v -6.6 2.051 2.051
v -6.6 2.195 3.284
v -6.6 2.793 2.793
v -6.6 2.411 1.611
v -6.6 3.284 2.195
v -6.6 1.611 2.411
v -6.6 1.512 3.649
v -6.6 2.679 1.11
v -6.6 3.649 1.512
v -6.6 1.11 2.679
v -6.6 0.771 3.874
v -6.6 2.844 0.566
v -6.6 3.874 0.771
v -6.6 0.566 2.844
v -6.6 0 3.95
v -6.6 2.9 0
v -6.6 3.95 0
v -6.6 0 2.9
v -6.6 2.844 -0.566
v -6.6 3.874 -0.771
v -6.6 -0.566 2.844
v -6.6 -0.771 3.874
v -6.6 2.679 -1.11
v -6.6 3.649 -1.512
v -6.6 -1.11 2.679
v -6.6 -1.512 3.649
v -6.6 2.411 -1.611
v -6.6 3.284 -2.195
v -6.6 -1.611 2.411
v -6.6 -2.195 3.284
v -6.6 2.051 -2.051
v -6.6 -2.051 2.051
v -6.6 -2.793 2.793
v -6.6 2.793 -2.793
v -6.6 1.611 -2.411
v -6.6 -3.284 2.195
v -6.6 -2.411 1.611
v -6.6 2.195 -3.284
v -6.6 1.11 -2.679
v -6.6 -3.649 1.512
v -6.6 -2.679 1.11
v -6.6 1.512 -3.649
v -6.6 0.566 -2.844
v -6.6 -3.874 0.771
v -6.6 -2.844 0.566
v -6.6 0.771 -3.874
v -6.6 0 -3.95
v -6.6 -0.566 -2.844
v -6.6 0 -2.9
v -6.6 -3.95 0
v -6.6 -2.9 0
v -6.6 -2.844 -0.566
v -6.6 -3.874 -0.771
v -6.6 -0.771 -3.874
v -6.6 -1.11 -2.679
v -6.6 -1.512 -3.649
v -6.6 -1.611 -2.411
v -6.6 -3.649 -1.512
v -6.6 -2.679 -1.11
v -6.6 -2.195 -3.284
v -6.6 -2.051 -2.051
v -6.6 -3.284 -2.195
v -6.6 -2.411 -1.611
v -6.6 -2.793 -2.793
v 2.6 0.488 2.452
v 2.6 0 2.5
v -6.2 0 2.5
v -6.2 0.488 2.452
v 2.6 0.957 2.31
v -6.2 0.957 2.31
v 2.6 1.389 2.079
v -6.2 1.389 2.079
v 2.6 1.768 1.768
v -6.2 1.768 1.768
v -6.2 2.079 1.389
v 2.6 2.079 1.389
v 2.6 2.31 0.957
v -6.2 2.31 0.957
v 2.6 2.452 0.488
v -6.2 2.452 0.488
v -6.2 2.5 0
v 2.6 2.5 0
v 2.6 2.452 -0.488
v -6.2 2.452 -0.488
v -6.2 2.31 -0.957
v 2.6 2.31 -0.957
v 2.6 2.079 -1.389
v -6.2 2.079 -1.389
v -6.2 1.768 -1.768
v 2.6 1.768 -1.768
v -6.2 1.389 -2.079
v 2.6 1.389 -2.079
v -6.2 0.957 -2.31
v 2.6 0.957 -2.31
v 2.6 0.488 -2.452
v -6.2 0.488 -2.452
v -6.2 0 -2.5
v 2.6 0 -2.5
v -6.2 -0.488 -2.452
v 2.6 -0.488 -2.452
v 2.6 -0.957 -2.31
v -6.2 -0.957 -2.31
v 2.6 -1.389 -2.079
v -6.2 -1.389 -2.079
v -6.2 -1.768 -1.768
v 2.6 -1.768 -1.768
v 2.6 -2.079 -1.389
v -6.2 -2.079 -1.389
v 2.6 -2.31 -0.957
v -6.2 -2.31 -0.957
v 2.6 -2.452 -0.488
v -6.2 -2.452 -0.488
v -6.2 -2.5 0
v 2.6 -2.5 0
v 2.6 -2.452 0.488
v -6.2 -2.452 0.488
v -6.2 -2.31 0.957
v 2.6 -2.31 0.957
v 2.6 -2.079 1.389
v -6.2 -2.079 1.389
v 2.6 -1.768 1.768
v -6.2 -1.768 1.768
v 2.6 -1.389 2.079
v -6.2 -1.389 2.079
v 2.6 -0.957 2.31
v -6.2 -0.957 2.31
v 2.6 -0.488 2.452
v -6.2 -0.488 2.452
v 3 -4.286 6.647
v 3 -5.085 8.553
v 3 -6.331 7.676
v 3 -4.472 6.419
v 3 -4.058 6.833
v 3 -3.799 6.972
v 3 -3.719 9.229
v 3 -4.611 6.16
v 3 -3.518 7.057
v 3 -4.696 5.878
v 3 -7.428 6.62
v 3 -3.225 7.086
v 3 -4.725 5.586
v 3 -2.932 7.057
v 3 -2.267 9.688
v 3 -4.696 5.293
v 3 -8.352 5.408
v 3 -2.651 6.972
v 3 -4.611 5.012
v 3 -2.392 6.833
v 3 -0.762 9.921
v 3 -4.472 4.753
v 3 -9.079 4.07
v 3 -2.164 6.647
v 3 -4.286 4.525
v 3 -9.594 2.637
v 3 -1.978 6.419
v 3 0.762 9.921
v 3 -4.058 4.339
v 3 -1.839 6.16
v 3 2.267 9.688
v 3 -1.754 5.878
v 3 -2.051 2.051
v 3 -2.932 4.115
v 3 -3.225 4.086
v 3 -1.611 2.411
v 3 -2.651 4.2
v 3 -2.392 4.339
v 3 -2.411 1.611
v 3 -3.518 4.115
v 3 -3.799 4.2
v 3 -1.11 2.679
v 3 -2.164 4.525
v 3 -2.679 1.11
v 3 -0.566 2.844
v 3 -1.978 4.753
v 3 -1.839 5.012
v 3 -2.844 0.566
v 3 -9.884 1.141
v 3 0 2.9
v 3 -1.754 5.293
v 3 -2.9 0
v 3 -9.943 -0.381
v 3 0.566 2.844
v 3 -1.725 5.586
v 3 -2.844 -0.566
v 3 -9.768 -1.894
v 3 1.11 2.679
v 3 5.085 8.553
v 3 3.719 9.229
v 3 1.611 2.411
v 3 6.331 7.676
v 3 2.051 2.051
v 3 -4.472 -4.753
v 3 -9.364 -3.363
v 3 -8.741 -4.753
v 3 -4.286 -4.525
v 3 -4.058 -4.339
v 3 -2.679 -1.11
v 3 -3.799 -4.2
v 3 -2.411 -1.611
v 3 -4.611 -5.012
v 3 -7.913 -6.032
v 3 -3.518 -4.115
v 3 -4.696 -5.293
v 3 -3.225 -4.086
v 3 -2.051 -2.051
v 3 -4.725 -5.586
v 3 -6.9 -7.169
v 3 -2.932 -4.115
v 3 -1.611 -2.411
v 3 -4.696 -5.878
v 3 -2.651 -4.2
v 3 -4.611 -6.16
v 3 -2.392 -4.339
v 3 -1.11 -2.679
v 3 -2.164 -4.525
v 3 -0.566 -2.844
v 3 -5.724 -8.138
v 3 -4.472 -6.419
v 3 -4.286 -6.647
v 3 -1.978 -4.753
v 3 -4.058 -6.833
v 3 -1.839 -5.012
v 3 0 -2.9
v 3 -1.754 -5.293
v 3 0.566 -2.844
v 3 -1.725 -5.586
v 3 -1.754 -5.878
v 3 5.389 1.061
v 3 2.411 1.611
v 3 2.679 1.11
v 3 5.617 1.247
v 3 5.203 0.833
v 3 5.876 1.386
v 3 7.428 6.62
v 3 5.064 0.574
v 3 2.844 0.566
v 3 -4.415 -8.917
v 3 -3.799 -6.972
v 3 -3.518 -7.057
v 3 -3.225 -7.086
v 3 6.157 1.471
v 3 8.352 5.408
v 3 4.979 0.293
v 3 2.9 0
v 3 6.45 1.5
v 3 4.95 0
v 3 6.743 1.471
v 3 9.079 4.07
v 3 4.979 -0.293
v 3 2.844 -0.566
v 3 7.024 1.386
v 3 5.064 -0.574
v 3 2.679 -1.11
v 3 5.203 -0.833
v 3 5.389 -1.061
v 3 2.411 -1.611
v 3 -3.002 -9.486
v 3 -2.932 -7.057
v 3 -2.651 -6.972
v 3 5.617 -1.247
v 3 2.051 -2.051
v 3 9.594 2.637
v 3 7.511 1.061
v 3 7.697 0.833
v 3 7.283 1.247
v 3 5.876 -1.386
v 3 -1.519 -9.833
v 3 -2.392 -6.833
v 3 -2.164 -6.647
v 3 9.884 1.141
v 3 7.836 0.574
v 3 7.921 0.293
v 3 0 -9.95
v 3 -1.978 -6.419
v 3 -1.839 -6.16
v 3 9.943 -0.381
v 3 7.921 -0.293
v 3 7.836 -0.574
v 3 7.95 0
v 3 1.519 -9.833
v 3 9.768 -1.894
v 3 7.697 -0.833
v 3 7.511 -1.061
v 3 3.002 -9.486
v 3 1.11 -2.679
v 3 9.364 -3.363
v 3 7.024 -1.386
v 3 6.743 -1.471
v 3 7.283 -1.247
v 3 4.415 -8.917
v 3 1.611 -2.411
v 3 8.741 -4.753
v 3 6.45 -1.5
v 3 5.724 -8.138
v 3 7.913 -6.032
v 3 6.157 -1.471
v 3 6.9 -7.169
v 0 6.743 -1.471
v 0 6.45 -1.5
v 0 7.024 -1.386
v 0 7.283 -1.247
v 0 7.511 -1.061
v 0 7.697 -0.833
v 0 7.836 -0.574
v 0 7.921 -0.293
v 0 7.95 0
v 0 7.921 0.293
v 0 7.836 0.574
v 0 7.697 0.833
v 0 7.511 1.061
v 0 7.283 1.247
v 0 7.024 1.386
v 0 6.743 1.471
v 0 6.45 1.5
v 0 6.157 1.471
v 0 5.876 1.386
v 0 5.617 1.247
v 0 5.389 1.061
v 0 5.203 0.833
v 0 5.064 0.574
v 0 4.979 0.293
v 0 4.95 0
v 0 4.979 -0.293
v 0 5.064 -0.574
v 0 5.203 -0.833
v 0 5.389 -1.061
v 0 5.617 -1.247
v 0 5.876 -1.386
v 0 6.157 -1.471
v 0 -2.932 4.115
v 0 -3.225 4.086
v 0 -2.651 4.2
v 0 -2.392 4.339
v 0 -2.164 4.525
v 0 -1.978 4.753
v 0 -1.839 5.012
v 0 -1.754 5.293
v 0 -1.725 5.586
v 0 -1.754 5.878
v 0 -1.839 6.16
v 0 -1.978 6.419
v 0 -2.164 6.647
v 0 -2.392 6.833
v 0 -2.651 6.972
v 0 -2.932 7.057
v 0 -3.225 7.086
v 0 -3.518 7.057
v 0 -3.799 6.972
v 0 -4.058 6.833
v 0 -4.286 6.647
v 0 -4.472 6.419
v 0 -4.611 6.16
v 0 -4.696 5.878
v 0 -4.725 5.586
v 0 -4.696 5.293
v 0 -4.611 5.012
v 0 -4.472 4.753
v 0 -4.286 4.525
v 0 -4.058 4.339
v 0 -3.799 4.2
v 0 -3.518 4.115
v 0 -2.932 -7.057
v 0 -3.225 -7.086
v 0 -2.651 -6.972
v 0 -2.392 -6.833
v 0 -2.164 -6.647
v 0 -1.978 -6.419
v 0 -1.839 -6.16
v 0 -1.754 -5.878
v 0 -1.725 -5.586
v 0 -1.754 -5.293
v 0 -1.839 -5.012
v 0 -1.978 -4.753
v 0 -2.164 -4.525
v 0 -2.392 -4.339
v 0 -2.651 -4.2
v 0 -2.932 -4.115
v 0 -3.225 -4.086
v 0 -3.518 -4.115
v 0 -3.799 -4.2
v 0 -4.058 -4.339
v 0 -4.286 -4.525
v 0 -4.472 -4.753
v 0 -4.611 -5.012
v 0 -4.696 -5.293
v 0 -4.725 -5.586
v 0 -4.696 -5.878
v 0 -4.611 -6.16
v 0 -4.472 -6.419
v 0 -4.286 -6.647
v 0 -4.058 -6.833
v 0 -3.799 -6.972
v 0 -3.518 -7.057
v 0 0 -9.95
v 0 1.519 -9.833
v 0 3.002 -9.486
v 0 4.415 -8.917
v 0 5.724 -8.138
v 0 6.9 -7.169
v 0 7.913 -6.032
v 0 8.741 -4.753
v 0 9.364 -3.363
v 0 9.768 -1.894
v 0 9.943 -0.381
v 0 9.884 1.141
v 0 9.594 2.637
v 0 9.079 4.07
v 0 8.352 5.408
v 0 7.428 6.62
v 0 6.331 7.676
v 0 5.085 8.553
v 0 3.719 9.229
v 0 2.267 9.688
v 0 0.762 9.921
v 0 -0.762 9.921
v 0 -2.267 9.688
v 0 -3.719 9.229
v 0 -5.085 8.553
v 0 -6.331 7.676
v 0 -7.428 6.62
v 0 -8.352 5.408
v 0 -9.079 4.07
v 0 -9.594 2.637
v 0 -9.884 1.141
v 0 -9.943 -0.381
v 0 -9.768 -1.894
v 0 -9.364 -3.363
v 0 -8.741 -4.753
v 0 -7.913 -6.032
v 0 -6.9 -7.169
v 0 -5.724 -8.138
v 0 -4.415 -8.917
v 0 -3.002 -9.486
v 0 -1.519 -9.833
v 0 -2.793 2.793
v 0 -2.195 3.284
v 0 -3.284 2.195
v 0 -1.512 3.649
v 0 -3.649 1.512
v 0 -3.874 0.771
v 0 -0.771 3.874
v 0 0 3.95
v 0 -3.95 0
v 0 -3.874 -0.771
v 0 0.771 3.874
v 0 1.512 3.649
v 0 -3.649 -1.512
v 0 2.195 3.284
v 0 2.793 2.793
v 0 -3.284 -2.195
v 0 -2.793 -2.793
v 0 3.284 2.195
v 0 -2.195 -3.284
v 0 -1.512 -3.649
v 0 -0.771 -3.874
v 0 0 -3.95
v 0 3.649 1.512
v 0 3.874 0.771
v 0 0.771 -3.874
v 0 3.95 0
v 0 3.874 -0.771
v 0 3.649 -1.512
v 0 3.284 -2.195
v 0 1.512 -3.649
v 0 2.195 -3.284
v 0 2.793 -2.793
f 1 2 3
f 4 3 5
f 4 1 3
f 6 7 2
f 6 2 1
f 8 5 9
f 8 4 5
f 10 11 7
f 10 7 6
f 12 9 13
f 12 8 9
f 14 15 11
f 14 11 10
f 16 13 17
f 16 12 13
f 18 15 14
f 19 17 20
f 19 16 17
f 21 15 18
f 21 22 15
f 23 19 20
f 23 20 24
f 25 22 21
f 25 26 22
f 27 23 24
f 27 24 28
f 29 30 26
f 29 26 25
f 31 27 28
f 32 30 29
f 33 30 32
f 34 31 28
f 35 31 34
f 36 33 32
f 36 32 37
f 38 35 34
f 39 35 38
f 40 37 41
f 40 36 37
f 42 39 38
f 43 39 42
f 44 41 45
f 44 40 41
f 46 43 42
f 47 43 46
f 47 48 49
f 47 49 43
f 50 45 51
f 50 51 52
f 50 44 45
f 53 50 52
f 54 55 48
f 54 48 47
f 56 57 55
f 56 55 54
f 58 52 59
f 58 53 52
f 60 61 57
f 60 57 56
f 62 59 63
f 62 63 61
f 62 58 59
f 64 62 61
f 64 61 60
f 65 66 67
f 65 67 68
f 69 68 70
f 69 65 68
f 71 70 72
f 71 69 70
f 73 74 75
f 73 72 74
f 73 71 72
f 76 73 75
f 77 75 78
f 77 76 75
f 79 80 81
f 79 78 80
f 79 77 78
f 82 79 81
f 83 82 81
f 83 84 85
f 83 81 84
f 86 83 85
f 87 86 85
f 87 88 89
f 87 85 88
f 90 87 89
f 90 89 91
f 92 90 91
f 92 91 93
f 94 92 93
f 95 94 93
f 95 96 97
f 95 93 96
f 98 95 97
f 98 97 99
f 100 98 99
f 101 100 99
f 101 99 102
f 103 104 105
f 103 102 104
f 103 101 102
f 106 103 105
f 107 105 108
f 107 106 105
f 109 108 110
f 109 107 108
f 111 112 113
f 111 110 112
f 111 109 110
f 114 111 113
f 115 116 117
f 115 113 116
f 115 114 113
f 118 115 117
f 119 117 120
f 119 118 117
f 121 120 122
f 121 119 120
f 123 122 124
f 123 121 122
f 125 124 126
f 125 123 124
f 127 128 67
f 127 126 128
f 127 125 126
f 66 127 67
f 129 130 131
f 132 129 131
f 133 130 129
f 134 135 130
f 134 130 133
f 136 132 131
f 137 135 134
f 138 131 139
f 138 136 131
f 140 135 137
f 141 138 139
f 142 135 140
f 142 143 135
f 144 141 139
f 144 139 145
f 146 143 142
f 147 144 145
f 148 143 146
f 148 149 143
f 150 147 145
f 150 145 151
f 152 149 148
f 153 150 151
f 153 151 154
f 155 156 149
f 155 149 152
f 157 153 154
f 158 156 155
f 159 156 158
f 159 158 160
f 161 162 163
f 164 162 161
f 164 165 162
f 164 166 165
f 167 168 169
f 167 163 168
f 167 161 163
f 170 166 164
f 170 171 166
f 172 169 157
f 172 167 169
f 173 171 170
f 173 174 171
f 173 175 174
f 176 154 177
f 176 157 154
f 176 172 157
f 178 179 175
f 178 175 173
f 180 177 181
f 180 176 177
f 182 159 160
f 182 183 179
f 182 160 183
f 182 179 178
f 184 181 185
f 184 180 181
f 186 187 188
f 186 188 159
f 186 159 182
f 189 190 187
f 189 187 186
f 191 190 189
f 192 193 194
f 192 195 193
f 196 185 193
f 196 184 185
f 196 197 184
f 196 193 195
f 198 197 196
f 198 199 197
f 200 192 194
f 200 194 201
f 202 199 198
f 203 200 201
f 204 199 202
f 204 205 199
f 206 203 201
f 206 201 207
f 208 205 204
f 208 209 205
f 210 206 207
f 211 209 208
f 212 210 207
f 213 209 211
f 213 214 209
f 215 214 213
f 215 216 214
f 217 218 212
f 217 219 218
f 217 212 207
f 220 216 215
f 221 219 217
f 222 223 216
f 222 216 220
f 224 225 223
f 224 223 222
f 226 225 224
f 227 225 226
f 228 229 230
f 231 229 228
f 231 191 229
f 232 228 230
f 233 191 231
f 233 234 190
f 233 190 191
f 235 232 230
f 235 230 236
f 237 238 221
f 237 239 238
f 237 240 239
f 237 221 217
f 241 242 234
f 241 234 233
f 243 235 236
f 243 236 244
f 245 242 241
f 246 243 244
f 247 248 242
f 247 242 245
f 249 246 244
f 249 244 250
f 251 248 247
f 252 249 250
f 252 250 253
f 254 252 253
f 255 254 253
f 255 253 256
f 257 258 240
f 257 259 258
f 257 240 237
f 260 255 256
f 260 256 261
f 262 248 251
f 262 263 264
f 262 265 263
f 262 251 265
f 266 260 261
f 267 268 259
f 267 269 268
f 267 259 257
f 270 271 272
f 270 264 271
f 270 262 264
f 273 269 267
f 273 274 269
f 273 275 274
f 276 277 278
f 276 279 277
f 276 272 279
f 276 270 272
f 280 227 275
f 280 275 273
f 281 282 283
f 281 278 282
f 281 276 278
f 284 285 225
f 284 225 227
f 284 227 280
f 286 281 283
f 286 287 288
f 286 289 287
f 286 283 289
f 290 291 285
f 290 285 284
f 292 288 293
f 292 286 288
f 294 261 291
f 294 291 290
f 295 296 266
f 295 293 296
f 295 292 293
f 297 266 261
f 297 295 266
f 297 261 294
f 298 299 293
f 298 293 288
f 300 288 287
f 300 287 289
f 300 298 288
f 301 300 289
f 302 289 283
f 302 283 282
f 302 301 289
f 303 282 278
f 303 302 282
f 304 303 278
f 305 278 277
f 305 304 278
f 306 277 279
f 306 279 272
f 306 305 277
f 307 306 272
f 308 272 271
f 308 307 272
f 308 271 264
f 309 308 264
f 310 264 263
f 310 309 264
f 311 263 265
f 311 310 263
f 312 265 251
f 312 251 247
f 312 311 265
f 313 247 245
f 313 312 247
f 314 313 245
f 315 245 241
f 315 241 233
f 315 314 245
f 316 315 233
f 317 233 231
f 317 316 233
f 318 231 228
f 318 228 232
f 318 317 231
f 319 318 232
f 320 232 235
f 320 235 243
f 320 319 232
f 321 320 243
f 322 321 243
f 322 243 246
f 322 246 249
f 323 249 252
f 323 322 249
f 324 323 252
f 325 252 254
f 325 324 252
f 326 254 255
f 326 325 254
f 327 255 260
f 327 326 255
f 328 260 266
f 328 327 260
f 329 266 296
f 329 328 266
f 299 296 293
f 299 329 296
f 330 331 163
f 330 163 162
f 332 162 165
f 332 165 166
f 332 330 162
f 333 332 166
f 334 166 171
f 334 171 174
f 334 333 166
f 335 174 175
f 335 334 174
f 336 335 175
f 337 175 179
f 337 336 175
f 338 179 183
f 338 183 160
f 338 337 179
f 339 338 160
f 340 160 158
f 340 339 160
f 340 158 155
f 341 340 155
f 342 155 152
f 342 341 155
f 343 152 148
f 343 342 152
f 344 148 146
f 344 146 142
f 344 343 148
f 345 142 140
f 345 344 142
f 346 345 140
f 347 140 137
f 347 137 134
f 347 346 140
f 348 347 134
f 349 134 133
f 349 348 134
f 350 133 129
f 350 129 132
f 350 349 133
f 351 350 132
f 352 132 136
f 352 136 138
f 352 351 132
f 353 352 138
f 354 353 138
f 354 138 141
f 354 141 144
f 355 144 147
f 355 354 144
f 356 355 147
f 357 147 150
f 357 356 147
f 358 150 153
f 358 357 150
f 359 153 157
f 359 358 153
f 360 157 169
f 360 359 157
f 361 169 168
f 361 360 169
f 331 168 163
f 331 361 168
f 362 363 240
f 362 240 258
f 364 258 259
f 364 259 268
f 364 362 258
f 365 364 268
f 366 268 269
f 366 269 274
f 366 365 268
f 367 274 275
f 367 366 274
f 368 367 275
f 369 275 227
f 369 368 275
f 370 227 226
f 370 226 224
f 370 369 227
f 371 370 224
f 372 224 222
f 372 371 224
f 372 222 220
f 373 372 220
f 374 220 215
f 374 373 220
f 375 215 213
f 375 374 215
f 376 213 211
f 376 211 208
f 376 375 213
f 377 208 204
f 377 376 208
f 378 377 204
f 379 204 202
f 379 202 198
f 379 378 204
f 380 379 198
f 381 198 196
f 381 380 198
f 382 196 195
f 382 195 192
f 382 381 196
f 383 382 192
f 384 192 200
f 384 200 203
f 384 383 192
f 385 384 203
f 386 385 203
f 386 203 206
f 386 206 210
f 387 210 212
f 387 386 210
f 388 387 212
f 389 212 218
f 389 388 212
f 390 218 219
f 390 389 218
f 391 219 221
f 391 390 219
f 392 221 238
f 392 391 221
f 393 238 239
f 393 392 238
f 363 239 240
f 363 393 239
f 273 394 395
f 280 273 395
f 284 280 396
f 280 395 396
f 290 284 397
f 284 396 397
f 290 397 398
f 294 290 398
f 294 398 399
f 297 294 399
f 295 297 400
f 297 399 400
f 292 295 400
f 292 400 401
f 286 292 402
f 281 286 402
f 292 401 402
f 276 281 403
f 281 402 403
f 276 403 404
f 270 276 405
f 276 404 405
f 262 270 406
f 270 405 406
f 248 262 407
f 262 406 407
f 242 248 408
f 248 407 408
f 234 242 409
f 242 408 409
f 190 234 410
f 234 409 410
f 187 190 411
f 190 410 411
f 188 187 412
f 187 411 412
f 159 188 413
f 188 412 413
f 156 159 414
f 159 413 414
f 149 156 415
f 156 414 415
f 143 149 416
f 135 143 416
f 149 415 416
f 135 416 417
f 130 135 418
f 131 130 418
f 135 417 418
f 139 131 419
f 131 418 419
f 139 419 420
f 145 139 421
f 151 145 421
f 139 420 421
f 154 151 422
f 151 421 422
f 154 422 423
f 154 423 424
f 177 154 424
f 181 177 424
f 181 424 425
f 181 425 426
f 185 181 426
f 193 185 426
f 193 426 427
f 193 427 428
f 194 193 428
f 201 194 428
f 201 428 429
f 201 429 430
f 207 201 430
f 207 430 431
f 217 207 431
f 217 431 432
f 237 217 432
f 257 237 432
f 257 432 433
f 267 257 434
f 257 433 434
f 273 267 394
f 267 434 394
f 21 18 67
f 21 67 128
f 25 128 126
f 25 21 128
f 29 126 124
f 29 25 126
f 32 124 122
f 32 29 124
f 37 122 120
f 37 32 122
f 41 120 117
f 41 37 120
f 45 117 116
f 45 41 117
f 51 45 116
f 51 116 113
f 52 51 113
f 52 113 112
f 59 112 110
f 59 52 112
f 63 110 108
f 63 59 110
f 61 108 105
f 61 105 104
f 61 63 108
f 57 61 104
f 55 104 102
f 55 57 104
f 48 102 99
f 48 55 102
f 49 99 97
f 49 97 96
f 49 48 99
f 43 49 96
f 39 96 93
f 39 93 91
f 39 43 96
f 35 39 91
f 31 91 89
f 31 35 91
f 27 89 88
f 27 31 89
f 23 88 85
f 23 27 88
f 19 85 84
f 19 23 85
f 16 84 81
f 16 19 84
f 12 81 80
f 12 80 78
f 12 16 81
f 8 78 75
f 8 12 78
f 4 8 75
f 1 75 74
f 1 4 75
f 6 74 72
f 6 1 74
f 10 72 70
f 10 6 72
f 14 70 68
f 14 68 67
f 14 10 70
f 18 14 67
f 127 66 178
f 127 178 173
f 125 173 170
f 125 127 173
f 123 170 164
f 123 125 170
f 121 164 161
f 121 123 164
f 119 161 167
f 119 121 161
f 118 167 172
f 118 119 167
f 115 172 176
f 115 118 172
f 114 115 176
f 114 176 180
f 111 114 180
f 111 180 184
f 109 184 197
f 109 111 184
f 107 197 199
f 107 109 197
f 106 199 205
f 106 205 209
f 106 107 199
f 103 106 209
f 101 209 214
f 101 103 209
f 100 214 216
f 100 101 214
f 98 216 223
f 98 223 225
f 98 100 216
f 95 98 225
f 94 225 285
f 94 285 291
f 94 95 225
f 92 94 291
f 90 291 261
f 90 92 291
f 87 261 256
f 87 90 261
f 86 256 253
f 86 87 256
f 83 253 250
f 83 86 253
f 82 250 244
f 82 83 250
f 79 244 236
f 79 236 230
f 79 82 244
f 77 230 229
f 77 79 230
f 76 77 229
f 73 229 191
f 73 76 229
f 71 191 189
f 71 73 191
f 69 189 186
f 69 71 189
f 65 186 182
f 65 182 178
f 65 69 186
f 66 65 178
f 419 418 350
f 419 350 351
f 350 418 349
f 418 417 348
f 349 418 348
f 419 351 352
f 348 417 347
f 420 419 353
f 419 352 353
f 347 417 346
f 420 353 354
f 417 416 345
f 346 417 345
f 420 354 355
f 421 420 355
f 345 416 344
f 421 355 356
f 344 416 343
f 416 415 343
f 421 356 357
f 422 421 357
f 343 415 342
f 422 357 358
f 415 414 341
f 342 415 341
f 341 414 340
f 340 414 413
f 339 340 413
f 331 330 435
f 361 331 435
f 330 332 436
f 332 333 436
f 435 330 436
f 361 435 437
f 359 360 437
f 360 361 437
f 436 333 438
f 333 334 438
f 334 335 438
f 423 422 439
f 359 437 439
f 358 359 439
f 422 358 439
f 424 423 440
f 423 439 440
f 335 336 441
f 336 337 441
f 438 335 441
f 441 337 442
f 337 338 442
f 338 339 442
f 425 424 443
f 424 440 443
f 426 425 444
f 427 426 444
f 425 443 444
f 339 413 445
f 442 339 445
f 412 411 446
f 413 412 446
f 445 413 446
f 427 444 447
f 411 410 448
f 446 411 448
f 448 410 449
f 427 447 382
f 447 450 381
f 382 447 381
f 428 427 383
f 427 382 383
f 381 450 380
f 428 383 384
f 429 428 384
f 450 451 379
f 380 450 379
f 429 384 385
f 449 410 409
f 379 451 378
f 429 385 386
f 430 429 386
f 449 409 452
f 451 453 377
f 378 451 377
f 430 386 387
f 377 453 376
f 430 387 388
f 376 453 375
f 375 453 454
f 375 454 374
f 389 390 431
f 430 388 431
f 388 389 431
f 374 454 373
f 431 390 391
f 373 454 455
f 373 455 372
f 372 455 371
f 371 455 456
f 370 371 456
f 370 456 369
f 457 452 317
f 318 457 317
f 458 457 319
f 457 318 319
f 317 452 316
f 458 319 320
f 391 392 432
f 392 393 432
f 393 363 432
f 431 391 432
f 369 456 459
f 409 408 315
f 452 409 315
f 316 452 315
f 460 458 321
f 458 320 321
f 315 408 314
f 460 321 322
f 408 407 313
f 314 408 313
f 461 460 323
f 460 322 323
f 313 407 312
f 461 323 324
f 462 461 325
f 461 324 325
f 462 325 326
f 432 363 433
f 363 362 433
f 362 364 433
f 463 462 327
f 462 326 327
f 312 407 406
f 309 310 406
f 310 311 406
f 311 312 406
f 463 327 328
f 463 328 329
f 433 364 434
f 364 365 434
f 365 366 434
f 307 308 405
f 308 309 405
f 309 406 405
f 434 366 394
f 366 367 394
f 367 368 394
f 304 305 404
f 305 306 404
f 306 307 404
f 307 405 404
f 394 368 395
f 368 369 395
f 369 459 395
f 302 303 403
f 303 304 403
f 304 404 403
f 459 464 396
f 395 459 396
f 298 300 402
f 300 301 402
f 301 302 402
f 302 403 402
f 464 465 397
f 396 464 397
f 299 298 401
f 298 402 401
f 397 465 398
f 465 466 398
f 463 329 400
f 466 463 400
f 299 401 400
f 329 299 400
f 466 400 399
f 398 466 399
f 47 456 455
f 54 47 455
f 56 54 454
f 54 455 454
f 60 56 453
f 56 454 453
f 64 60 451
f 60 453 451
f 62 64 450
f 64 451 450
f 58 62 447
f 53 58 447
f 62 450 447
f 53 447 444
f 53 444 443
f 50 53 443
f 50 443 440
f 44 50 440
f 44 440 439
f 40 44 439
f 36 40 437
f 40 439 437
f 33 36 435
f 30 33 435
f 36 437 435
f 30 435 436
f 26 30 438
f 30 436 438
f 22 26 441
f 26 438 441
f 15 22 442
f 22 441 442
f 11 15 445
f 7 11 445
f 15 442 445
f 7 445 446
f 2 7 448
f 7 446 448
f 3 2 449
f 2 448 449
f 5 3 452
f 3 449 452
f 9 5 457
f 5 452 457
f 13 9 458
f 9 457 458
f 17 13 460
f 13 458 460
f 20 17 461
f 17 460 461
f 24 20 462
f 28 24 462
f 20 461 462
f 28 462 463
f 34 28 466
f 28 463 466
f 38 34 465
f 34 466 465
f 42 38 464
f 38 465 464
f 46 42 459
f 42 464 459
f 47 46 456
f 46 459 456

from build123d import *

# Parameters (mm, degrees)
SKETCH_1_R               = 9.95
SKETCH_1_R_2             = 1.5
EXTRUDE_1_DEPTH          = 3
SKETCH_2_R               = 3.95
EXTRUDE_2_DEPTH          = 6.6
CUT_EXTRUDE_1_DEPTH      = 18.034230244
CUT_EXTRUDE_1_DEPTH_BACK = 18.034230244
SKETCH_3_R               = 2.5
CHAMFER_1_SIZE           = 0.4


with BuildPart() as part:
    # Эскиз1 → Бобышка-Вытянуть1 (new body)
    with BuildSketch(Plane(origin=(0, 0, 0), x_dir=(0, 0, -1), z_dir=(1, 0, 0))):
        Circle(SKETCH_1_R)
        with Locations((0, 6.45)):
            Circle(SKETCH_1_R_2, mode=Mode.SUBTRACT)
        with Locations((5.585863854, -3.225)):
            Circle(SKETCH_1_R_2, mode=Mode.SUBTRACT)
        with Locations((-5.585863854, -3.225)):
            Circle(SKETCH_1_R_2, mode=Mode.SUBTRACT)
    extrude(amount=EXTRUDE_1_DEPTH)

    # Эскиз2 → Бобышка-Вытянуть2 (add)
    with BuildSketch(Plane.ZY):
        with Locations(Location((0, 0, 0), (0, 0, 180))):
            Circle(SKETCH_2_R)
    extrude(amount=EXTRUDE_2_DEPTH)

    # Эскиз3 → Вырез-Вытянуть1 (cut, two sides: drawn at the far end of the back side and taken through both)
    with BuildSketch(Plane.ZY.offset(6.6).offset(-CUT_EXTRUDE_1_DEPTH_BACK)):
        Circle(SKETCH_3_R)
    extrude(amount=CUT_EXTRUDE_1_DEPTH + CUT_EXTRUDE_1_DEPTH_BACK, mode=Mode.SUBTRACT)

    # Фаска1
    chamfer_1_edges = [part.edges().sort_by_distance(p)[0] for p in [
        (-6.6, 0, -2.5),
        (3, 0, -2.5),
    ]]
    chamfer(chamfer_1_edges, length=CHAMFER_1_SIZE)


solid = part.part
